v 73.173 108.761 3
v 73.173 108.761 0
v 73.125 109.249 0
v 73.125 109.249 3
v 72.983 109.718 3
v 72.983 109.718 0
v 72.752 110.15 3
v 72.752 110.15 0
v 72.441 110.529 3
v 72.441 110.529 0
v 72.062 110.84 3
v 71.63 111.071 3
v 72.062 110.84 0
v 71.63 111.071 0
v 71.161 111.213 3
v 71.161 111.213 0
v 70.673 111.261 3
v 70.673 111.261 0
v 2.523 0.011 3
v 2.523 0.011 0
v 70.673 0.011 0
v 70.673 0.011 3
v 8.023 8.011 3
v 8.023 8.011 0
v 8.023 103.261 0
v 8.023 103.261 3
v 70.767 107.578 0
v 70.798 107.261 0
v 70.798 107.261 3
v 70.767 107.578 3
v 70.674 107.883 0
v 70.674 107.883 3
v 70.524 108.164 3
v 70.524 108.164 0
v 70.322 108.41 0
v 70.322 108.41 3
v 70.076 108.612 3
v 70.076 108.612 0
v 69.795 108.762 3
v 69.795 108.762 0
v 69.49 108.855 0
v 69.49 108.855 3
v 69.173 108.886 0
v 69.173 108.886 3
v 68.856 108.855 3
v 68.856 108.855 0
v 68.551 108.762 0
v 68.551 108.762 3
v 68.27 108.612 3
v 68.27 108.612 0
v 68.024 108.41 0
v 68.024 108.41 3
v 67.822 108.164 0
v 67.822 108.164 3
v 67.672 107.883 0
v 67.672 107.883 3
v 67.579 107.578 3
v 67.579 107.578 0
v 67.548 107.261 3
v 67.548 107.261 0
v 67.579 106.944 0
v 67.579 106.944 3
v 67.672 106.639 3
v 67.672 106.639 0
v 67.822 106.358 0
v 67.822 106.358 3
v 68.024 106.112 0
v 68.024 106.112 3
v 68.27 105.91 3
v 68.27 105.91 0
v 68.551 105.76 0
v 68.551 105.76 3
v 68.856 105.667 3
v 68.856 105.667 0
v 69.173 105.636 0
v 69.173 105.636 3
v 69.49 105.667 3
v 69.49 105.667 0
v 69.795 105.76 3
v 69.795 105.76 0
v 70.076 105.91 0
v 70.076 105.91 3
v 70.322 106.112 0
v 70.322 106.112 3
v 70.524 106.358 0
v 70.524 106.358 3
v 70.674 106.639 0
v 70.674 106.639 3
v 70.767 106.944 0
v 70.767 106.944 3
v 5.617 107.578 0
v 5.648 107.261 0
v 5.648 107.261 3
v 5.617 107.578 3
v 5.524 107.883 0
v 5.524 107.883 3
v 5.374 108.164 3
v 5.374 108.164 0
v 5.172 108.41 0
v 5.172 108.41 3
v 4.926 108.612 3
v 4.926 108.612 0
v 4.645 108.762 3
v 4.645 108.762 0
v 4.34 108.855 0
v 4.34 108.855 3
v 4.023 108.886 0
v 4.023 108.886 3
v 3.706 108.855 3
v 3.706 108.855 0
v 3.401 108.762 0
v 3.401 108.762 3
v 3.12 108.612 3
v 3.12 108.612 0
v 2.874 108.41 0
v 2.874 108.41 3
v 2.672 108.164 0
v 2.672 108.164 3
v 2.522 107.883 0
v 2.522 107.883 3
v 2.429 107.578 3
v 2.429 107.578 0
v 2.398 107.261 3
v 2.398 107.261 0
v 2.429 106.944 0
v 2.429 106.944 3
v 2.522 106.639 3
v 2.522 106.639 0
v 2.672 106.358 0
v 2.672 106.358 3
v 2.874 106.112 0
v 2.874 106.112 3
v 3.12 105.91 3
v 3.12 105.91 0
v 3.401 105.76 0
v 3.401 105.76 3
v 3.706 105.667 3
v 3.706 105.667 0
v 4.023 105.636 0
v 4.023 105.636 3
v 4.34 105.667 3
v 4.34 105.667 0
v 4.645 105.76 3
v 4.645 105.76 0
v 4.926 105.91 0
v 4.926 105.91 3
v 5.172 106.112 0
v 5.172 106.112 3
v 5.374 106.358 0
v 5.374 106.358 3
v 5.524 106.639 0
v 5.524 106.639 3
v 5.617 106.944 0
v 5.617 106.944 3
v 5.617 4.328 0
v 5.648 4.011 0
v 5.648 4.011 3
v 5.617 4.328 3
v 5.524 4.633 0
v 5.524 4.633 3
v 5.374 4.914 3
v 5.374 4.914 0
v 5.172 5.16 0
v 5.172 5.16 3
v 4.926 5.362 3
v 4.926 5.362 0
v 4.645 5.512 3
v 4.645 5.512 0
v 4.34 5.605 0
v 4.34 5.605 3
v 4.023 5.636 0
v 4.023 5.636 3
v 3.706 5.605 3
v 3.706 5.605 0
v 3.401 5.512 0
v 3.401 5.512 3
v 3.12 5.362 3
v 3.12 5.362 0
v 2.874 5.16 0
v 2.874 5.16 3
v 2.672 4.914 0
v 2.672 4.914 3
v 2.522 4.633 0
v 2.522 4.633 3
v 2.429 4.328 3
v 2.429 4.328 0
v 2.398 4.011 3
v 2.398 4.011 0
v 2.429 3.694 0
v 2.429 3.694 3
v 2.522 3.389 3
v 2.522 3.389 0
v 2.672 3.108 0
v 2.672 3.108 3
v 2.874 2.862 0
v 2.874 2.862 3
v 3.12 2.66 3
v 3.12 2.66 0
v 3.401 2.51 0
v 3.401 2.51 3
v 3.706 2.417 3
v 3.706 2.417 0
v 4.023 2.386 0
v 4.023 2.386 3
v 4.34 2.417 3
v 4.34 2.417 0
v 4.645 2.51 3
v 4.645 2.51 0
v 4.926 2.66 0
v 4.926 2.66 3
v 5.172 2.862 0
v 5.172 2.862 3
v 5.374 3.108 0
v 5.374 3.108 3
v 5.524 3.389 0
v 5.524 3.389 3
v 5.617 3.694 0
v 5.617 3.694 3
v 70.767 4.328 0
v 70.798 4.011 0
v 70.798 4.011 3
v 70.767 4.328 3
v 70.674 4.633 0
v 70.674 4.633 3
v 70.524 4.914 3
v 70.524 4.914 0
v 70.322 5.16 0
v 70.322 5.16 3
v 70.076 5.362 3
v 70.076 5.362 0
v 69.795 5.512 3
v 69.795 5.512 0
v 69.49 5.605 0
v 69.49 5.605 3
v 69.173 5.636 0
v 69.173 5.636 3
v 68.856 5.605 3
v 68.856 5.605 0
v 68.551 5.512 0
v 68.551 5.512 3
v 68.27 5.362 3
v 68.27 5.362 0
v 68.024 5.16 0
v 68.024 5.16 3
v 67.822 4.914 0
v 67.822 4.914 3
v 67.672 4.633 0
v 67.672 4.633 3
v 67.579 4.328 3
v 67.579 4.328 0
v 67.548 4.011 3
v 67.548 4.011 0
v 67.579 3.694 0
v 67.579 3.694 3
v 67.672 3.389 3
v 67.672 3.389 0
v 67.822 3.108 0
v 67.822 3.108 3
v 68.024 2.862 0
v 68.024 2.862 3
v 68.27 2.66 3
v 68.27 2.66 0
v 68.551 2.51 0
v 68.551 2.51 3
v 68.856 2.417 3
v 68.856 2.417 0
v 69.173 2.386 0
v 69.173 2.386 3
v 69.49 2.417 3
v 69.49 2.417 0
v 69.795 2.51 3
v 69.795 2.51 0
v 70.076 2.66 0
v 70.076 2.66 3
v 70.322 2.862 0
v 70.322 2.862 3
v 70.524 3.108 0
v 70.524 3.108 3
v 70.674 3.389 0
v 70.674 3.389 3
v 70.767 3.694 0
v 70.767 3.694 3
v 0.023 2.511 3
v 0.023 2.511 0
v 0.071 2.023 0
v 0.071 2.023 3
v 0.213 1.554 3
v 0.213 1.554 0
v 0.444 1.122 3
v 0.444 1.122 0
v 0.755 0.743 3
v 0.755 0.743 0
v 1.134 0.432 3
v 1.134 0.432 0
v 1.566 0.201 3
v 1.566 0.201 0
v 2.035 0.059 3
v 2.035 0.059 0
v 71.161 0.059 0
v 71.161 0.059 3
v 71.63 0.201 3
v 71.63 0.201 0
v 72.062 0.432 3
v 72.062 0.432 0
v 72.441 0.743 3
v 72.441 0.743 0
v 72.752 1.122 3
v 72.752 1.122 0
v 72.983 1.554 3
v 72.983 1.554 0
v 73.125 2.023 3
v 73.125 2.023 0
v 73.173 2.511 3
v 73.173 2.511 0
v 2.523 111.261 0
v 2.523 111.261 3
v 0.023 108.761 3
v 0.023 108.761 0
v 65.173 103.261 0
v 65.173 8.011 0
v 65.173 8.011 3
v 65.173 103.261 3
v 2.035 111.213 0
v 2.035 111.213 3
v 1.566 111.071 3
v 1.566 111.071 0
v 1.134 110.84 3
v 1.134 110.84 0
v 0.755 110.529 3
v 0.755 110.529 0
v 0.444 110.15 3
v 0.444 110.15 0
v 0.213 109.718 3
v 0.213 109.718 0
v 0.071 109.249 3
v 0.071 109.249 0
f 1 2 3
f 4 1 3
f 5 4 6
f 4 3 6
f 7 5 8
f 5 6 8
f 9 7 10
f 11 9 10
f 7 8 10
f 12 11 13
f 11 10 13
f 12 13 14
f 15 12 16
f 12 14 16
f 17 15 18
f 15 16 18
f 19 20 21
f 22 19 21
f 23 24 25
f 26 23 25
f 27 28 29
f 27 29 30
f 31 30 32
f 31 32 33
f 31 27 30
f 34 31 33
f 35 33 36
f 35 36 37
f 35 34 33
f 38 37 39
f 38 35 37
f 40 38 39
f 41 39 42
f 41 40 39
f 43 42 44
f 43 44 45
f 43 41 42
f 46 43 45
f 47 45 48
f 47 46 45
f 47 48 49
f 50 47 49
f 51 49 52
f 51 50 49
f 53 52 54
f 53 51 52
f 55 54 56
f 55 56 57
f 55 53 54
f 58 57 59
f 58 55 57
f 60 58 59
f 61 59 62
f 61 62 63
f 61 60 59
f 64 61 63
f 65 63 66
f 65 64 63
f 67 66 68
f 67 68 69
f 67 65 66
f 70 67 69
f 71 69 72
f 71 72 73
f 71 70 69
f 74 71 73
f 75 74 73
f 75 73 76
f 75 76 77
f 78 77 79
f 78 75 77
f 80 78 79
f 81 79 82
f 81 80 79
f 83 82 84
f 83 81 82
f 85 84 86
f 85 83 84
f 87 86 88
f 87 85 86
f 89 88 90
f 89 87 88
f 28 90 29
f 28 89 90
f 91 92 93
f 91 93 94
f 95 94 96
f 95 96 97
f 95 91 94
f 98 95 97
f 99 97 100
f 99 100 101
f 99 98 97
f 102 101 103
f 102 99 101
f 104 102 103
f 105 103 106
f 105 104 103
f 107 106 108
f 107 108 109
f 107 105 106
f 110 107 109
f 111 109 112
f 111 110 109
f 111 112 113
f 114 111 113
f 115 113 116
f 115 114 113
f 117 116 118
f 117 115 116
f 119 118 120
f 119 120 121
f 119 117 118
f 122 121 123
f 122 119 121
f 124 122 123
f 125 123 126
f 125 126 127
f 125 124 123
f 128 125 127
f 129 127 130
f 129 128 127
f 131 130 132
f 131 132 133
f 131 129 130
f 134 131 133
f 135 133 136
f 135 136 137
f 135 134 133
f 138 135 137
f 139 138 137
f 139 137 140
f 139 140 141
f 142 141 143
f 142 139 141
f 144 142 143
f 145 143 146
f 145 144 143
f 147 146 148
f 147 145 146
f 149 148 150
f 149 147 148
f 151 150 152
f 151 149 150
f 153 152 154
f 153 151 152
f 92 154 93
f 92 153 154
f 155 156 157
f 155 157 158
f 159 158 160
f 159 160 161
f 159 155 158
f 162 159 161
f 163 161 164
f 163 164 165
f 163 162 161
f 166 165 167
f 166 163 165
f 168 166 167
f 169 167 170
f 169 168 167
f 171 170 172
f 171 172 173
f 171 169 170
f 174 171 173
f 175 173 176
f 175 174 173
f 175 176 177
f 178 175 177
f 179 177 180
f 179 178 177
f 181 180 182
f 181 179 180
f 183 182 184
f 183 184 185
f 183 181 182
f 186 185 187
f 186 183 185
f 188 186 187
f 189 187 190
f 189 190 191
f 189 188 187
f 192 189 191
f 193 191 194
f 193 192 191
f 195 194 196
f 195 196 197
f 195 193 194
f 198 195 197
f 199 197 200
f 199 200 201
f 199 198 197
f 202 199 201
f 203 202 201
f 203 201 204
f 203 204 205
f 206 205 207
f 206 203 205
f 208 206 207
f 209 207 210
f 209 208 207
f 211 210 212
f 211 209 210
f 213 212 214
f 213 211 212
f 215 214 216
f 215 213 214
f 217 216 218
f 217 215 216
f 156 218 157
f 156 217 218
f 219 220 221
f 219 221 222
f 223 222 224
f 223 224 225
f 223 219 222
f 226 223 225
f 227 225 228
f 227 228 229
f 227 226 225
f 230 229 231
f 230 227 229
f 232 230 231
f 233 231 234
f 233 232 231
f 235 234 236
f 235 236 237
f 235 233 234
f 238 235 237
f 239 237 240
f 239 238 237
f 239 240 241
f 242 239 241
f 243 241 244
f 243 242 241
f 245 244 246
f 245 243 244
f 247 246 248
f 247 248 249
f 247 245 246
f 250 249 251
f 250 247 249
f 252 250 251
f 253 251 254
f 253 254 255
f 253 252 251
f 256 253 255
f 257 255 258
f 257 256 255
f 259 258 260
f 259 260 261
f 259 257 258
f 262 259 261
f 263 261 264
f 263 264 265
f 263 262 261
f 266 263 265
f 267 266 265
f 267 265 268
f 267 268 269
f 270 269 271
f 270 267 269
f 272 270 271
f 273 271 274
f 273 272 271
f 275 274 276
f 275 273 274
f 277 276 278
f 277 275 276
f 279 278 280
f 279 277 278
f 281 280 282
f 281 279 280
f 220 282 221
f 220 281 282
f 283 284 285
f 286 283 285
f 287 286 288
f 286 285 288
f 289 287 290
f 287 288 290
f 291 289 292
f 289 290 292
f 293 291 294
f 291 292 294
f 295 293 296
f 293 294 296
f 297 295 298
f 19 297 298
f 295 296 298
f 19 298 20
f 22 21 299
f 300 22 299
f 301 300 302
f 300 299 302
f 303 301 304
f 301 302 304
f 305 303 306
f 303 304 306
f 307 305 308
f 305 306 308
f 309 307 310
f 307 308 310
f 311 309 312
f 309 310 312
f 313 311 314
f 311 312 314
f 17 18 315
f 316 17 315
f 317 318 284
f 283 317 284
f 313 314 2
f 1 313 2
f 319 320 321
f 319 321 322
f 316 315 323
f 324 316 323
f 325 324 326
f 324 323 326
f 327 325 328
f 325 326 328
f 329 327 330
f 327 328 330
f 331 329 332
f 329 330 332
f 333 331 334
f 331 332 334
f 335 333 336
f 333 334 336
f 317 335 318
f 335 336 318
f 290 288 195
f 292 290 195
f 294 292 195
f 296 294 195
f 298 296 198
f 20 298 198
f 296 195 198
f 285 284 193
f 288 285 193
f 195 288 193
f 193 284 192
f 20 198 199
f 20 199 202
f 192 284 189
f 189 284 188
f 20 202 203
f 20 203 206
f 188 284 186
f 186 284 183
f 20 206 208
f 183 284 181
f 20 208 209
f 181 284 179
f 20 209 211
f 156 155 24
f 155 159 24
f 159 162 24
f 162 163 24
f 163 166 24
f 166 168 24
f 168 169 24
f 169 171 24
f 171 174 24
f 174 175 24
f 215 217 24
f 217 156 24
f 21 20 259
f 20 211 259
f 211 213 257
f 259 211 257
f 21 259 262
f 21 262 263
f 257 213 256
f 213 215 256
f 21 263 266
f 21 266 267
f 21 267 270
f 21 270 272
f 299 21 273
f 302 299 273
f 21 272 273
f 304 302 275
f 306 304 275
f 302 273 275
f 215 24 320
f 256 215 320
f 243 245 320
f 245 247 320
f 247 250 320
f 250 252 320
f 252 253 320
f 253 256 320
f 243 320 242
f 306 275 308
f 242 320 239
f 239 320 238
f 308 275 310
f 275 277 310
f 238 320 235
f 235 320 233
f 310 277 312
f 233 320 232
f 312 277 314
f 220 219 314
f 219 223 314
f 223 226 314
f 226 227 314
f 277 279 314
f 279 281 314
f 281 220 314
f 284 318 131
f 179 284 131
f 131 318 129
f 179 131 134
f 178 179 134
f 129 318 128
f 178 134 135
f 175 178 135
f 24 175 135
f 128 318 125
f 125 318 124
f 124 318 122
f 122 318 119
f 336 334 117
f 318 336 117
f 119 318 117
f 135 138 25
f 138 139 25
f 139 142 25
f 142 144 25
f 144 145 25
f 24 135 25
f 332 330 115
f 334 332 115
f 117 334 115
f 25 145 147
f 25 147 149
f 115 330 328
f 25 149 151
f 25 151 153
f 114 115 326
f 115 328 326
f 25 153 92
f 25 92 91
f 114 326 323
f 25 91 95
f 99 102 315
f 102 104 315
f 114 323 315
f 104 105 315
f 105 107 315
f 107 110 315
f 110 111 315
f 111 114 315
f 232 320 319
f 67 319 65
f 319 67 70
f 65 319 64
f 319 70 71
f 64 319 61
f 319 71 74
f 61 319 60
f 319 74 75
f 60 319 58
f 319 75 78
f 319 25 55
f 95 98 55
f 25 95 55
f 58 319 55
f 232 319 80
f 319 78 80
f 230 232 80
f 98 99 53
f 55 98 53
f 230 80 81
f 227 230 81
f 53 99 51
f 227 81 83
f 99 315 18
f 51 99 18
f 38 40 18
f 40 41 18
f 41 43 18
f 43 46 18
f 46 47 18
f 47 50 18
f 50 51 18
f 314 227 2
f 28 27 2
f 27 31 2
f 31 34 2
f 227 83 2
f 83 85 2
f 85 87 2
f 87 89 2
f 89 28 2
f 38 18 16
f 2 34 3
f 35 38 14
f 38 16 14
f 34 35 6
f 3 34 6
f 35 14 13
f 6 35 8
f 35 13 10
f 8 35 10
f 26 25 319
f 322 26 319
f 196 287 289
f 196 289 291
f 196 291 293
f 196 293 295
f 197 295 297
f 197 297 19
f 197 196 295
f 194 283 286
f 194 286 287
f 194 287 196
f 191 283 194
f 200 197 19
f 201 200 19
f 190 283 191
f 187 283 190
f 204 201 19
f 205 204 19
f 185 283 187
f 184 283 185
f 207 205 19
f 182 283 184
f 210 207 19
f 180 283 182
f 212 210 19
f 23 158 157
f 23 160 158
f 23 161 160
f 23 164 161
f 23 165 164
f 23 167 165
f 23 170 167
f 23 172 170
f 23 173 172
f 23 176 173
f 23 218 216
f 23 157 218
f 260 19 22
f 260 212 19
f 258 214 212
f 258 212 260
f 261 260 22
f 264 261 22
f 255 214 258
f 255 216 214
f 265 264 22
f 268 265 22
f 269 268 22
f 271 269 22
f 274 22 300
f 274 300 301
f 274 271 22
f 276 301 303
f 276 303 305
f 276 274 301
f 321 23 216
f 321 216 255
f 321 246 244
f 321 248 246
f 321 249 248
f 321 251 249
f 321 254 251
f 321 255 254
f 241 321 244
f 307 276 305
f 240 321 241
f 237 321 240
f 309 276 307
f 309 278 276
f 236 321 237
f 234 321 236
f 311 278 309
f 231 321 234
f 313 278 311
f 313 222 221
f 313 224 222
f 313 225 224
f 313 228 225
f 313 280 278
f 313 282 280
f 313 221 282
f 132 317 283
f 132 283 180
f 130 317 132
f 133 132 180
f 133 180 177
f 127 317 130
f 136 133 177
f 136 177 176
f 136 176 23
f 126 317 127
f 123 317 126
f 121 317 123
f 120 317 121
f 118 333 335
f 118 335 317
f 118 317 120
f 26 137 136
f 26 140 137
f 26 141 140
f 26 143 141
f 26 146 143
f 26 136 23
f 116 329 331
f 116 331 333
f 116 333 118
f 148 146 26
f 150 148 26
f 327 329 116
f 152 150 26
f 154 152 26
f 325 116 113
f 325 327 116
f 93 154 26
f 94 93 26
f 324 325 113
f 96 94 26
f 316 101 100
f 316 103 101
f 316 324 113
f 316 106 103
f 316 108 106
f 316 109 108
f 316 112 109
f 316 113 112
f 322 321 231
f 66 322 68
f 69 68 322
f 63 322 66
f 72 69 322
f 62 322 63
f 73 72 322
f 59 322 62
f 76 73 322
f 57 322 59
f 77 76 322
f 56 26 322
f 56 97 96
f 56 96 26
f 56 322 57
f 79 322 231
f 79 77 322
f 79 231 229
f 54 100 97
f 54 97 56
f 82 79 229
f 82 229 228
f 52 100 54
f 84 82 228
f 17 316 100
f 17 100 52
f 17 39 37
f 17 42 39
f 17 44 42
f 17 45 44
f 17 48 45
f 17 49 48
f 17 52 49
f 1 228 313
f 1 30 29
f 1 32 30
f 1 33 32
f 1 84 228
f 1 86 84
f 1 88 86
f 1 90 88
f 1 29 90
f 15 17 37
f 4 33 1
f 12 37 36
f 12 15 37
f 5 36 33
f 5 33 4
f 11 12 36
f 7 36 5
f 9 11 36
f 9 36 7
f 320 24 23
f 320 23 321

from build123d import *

# Parameters (mm, degrees)
MODEL_R         = 1.625
MODEL_W         = 57.1502154
MODEL_H         = 95.249807
EXTRUDE_1_DEPTH = 3


with BuildPart() as part:
    # Model → 凸台-拉伸1 (new body)
    with BuildSketch(Plane.XY):
        with BuildLine():
            Line((8.022847613, 111.260961872), (2.522847613, 111.260961872))
            ThreePointArc((2.522847613, 111.260961872), (0.75508066, 110.528728825), (0.022847613, 108.760961872))
            Line((0.022847613, 108.760961872), (0.022847613, 8.011154872))
            Line((0.022847613, 8.011154872), (0.022847613, 2.511154872))
            ThreePointArc((0.022847613, 2.511154872), (0.75508066, 0.743387919), (2.522847613, 0.011154872))
            Line((2.522847613, 0.011154872), (65.173063013, 0.011154872))
            Line((65.173063013, 0.011154872), (70.673063013, 0.011154872))
            ThreePointArc((70.673063013, 0.011154872), (72.440829966, 0.743387919), (73.173063013, 2.511154872))
            Line((73.173063013, 2.511154872), (73.173063013, 8.011154872))
            Line((73.173063013, 8.011154872), (73.173063013, 108.760961872))
            ThreePointArc((73.173063013, 108.760961872), (72.440829966, 110.528728825), (70.673063013, 111.260961872))
            Line((70.673063013, 111.260961872), (8.022847613, 111.260961872))
        make_face()
        with Locations((69.173063013, 4.011154872)):
            Circle(MODEL_R, mode=Mode.SUBTRACT)
        with Locations((4.022847613, 4.011154872)):
            Circle(MODEL_R, mode=Mode.SUBTRACT)
        with Locations((4.022847613, 107.260961872)):
            Circle(MODEL_R, mode=Mode.SUBTRACT)
        with Locations((69.173063013, 107.260961872)):
            Circle(MODEL_R, mode=Mode.SUBTRACT)
        with Locations((36.597955313, 55.636058372)):
            Rectangle(MODEL_W, MODEL_H, mode=Mode.SUBTRACT)
    extrude(amount=EXTRUDE_1_DEPTH)


solid = part.part
